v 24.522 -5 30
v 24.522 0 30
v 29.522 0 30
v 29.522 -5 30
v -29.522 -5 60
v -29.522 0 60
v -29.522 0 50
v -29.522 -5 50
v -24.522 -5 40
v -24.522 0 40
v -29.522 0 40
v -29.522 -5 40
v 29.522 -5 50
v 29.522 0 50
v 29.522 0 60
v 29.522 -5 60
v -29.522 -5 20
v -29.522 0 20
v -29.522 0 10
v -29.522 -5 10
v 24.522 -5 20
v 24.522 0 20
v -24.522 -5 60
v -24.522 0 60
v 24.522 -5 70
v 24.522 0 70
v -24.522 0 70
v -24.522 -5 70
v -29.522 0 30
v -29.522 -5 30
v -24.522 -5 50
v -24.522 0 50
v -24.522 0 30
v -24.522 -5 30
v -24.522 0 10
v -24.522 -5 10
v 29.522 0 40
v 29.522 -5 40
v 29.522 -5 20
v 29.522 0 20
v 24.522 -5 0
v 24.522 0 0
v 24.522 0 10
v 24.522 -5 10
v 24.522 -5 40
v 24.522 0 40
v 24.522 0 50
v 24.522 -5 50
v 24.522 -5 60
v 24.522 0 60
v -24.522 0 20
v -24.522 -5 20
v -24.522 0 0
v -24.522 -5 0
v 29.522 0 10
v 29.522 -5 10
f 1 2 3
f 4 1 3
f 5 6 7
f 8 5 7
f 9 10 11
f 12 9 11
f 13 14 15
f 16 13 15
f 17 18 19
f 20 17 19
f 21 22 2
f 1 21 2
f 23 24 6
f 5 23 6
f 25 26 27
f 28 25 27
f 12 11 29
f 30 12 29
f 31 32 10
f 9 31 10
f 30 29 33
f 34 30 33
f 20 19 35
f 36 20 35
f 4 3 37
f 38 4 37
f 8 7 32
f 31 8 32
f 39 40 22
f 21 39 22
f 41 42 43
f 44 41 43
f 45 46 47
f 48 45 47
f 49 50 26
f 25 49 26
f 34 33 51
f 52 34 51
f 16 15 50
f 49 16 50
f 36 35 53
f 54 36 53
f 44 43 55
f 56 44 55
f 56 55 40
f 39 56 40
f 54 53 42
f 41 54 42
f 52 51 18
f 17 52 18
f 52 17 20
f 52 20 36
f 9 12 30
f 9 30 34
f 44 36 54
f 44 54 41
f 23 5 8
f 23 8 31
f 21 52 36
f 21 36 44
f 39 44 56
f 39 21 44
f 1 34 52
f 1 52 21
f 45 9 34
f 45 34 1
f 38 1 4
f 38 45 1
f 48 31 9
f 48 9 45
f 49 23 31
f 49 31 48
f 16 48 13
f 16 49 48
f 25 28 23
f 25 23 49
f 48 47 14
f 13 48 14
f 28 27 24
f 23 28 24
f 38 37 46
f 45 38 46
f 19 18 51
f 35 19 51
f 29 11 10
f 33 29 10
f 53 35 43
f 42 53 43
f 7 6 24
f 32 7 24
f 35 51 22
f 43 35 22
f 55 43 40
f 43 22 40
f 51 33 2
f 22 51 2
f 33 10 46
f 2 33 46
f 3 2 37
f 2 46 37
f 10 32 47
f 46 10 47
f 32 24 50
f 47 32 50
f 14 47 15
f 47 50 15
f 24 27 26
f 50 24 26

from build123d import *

# Parameters (mm, degrees)
F1_DEPTH = 5


with BuildPart() as f1:
    # F0 (on Front) → F1 (new body)
    with BuildSketch(Plane.XZ):
        Polygon((0, 0), (0, 70), (-24.521741, 70), (-24.521741, 60), (-29.521741, 60), (-29.521741, 50), (-24.521741, 50), (-24.521741, 40), (-29.521741, 40), (-29.521741, 30), (-24.521741, 30), (-24.521741, 20), (-29.521741, 20), (-29.521741, 10), (-24.521741, 10), (-24.521741, 0), align=None)
        Polygon((24.521741, 70), (0, 70), (0, 0), (24.521741, 0), (24.521741, 10), (29.521741, 10), (29.521741, 20), (24.521741, 20), (24.521741, 30), (29.521741, 30), (29.521741, 40), (24.521741, 40), (24.521741, 50), (29.521741, 50), (29.521741, 60), (24.521741, 60), align=None)
    extrude(amount=F1_DEPTH)


solid = f1.part
